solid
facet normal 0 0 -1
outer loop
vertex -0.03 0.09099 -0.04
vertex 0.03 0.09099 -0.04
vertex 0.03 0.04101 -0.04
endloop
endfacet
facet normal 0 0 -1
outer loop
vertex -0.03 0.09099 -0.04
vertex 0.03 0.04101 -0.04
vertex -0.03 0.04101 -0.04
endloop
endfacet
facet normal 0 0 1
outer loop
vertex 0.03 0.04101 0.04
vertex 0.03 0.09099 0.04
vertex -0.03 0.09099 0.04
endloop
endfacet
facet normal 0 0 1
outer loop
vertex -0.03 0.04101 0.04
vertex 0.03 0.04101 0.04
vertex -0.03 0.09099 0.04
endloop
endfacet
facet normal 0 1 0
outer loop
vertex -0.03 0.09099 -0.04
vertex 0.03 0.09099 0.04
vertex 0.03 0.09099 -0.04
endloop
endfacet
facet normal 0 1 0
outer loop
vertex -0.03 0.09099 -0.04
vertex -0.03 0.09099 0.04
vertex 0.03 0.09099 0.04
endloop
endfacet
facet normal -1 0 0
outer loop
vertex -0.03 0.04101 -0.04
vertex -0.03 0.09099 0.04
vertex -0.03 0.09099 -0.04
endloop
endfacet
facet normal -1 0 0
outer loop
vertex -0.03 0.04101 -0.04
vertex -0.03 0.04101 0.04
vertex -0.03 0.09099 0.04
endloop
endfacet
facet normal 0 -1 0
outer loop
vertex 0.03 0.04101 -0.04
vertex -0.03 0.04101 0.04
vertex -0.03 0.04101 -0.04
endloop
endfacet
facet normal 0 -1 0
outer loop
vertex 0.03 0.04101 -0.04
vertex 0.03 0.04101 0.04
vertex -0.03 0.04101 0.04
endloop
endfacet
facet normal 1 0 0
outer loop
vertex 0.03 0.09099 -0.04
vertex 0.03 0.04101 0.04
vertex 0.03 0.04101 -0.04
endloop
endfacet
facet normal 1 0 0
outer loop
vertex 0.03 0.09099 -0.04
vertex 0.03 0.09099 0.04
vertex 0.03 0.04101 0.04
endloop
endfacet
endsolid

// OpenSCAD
$fn=64;

sx=0.1;
sy=0.2;
sz=0.1;

module chamfered_block(size=[0.06,0.05,0.08], chamfer=0.004){
    x=size[0]; y=size[1]; z=size[2];
    c=max(0.0005, min(chamfer, min(x,y)/4));
    linear_extrude(height=z, center=true, convexity=10)
        offset(delta=-c)
            offset(delta=c)
                square([x,y], center=true);
}

module faceted_rod(len=0.2, r=0.012, twist=120, facets=10){
    linear_extrude(height=len, center=true, twist=twist, slices=60, convexity=10)
        polygon(points=[for(i=[0:facets-1]) [r*(0.85+0.25*sin(i*137)), r*(0.85+0.25*cos(i*91))] * [cos(360*i/facets), sin(360*i/facets)]]);
}

module faceted_knob(h=0.03, r=0.02, facets=8, twist=25){
    linear_extrude(height=h, center=true, twist=twist, slices=30, convexity=10)
        polygon(points=[for(i=[0:facets-1]) [r*(0.9+0.15*sin(i*73)), r*(0.9+0.15*cos(i*41))] * [cos(360*i/facets), sin(360*i/facets)]]);
}

module assembly(){
    union(){
        // Main rod along Y axis
        rotate([90,0,0]) faceted_rod(len=sy, r=0.012, twist=160, facets=11);

        // Block near one end
        translate([0, sy*0.33, 0])
            chamfered_block(size=[0.06,0.05,0.08], chamfer=0.004);

        // Knob closer to block
        translate([0.028, sy*0.10, 0.0])
            rotate([0,25,15])
                faceted_knob(h=0.03, r=0.02, facets=8, twist=35);

        // Knob farther away
        translate([-0.03, -sy*0.18, 0.01])
            rotate([10,-20,35])
                faceted_knob(h=0.028, r=0.018, facets=9, twist=-30);
    }
}

scale([1,1,1]) assembly();
